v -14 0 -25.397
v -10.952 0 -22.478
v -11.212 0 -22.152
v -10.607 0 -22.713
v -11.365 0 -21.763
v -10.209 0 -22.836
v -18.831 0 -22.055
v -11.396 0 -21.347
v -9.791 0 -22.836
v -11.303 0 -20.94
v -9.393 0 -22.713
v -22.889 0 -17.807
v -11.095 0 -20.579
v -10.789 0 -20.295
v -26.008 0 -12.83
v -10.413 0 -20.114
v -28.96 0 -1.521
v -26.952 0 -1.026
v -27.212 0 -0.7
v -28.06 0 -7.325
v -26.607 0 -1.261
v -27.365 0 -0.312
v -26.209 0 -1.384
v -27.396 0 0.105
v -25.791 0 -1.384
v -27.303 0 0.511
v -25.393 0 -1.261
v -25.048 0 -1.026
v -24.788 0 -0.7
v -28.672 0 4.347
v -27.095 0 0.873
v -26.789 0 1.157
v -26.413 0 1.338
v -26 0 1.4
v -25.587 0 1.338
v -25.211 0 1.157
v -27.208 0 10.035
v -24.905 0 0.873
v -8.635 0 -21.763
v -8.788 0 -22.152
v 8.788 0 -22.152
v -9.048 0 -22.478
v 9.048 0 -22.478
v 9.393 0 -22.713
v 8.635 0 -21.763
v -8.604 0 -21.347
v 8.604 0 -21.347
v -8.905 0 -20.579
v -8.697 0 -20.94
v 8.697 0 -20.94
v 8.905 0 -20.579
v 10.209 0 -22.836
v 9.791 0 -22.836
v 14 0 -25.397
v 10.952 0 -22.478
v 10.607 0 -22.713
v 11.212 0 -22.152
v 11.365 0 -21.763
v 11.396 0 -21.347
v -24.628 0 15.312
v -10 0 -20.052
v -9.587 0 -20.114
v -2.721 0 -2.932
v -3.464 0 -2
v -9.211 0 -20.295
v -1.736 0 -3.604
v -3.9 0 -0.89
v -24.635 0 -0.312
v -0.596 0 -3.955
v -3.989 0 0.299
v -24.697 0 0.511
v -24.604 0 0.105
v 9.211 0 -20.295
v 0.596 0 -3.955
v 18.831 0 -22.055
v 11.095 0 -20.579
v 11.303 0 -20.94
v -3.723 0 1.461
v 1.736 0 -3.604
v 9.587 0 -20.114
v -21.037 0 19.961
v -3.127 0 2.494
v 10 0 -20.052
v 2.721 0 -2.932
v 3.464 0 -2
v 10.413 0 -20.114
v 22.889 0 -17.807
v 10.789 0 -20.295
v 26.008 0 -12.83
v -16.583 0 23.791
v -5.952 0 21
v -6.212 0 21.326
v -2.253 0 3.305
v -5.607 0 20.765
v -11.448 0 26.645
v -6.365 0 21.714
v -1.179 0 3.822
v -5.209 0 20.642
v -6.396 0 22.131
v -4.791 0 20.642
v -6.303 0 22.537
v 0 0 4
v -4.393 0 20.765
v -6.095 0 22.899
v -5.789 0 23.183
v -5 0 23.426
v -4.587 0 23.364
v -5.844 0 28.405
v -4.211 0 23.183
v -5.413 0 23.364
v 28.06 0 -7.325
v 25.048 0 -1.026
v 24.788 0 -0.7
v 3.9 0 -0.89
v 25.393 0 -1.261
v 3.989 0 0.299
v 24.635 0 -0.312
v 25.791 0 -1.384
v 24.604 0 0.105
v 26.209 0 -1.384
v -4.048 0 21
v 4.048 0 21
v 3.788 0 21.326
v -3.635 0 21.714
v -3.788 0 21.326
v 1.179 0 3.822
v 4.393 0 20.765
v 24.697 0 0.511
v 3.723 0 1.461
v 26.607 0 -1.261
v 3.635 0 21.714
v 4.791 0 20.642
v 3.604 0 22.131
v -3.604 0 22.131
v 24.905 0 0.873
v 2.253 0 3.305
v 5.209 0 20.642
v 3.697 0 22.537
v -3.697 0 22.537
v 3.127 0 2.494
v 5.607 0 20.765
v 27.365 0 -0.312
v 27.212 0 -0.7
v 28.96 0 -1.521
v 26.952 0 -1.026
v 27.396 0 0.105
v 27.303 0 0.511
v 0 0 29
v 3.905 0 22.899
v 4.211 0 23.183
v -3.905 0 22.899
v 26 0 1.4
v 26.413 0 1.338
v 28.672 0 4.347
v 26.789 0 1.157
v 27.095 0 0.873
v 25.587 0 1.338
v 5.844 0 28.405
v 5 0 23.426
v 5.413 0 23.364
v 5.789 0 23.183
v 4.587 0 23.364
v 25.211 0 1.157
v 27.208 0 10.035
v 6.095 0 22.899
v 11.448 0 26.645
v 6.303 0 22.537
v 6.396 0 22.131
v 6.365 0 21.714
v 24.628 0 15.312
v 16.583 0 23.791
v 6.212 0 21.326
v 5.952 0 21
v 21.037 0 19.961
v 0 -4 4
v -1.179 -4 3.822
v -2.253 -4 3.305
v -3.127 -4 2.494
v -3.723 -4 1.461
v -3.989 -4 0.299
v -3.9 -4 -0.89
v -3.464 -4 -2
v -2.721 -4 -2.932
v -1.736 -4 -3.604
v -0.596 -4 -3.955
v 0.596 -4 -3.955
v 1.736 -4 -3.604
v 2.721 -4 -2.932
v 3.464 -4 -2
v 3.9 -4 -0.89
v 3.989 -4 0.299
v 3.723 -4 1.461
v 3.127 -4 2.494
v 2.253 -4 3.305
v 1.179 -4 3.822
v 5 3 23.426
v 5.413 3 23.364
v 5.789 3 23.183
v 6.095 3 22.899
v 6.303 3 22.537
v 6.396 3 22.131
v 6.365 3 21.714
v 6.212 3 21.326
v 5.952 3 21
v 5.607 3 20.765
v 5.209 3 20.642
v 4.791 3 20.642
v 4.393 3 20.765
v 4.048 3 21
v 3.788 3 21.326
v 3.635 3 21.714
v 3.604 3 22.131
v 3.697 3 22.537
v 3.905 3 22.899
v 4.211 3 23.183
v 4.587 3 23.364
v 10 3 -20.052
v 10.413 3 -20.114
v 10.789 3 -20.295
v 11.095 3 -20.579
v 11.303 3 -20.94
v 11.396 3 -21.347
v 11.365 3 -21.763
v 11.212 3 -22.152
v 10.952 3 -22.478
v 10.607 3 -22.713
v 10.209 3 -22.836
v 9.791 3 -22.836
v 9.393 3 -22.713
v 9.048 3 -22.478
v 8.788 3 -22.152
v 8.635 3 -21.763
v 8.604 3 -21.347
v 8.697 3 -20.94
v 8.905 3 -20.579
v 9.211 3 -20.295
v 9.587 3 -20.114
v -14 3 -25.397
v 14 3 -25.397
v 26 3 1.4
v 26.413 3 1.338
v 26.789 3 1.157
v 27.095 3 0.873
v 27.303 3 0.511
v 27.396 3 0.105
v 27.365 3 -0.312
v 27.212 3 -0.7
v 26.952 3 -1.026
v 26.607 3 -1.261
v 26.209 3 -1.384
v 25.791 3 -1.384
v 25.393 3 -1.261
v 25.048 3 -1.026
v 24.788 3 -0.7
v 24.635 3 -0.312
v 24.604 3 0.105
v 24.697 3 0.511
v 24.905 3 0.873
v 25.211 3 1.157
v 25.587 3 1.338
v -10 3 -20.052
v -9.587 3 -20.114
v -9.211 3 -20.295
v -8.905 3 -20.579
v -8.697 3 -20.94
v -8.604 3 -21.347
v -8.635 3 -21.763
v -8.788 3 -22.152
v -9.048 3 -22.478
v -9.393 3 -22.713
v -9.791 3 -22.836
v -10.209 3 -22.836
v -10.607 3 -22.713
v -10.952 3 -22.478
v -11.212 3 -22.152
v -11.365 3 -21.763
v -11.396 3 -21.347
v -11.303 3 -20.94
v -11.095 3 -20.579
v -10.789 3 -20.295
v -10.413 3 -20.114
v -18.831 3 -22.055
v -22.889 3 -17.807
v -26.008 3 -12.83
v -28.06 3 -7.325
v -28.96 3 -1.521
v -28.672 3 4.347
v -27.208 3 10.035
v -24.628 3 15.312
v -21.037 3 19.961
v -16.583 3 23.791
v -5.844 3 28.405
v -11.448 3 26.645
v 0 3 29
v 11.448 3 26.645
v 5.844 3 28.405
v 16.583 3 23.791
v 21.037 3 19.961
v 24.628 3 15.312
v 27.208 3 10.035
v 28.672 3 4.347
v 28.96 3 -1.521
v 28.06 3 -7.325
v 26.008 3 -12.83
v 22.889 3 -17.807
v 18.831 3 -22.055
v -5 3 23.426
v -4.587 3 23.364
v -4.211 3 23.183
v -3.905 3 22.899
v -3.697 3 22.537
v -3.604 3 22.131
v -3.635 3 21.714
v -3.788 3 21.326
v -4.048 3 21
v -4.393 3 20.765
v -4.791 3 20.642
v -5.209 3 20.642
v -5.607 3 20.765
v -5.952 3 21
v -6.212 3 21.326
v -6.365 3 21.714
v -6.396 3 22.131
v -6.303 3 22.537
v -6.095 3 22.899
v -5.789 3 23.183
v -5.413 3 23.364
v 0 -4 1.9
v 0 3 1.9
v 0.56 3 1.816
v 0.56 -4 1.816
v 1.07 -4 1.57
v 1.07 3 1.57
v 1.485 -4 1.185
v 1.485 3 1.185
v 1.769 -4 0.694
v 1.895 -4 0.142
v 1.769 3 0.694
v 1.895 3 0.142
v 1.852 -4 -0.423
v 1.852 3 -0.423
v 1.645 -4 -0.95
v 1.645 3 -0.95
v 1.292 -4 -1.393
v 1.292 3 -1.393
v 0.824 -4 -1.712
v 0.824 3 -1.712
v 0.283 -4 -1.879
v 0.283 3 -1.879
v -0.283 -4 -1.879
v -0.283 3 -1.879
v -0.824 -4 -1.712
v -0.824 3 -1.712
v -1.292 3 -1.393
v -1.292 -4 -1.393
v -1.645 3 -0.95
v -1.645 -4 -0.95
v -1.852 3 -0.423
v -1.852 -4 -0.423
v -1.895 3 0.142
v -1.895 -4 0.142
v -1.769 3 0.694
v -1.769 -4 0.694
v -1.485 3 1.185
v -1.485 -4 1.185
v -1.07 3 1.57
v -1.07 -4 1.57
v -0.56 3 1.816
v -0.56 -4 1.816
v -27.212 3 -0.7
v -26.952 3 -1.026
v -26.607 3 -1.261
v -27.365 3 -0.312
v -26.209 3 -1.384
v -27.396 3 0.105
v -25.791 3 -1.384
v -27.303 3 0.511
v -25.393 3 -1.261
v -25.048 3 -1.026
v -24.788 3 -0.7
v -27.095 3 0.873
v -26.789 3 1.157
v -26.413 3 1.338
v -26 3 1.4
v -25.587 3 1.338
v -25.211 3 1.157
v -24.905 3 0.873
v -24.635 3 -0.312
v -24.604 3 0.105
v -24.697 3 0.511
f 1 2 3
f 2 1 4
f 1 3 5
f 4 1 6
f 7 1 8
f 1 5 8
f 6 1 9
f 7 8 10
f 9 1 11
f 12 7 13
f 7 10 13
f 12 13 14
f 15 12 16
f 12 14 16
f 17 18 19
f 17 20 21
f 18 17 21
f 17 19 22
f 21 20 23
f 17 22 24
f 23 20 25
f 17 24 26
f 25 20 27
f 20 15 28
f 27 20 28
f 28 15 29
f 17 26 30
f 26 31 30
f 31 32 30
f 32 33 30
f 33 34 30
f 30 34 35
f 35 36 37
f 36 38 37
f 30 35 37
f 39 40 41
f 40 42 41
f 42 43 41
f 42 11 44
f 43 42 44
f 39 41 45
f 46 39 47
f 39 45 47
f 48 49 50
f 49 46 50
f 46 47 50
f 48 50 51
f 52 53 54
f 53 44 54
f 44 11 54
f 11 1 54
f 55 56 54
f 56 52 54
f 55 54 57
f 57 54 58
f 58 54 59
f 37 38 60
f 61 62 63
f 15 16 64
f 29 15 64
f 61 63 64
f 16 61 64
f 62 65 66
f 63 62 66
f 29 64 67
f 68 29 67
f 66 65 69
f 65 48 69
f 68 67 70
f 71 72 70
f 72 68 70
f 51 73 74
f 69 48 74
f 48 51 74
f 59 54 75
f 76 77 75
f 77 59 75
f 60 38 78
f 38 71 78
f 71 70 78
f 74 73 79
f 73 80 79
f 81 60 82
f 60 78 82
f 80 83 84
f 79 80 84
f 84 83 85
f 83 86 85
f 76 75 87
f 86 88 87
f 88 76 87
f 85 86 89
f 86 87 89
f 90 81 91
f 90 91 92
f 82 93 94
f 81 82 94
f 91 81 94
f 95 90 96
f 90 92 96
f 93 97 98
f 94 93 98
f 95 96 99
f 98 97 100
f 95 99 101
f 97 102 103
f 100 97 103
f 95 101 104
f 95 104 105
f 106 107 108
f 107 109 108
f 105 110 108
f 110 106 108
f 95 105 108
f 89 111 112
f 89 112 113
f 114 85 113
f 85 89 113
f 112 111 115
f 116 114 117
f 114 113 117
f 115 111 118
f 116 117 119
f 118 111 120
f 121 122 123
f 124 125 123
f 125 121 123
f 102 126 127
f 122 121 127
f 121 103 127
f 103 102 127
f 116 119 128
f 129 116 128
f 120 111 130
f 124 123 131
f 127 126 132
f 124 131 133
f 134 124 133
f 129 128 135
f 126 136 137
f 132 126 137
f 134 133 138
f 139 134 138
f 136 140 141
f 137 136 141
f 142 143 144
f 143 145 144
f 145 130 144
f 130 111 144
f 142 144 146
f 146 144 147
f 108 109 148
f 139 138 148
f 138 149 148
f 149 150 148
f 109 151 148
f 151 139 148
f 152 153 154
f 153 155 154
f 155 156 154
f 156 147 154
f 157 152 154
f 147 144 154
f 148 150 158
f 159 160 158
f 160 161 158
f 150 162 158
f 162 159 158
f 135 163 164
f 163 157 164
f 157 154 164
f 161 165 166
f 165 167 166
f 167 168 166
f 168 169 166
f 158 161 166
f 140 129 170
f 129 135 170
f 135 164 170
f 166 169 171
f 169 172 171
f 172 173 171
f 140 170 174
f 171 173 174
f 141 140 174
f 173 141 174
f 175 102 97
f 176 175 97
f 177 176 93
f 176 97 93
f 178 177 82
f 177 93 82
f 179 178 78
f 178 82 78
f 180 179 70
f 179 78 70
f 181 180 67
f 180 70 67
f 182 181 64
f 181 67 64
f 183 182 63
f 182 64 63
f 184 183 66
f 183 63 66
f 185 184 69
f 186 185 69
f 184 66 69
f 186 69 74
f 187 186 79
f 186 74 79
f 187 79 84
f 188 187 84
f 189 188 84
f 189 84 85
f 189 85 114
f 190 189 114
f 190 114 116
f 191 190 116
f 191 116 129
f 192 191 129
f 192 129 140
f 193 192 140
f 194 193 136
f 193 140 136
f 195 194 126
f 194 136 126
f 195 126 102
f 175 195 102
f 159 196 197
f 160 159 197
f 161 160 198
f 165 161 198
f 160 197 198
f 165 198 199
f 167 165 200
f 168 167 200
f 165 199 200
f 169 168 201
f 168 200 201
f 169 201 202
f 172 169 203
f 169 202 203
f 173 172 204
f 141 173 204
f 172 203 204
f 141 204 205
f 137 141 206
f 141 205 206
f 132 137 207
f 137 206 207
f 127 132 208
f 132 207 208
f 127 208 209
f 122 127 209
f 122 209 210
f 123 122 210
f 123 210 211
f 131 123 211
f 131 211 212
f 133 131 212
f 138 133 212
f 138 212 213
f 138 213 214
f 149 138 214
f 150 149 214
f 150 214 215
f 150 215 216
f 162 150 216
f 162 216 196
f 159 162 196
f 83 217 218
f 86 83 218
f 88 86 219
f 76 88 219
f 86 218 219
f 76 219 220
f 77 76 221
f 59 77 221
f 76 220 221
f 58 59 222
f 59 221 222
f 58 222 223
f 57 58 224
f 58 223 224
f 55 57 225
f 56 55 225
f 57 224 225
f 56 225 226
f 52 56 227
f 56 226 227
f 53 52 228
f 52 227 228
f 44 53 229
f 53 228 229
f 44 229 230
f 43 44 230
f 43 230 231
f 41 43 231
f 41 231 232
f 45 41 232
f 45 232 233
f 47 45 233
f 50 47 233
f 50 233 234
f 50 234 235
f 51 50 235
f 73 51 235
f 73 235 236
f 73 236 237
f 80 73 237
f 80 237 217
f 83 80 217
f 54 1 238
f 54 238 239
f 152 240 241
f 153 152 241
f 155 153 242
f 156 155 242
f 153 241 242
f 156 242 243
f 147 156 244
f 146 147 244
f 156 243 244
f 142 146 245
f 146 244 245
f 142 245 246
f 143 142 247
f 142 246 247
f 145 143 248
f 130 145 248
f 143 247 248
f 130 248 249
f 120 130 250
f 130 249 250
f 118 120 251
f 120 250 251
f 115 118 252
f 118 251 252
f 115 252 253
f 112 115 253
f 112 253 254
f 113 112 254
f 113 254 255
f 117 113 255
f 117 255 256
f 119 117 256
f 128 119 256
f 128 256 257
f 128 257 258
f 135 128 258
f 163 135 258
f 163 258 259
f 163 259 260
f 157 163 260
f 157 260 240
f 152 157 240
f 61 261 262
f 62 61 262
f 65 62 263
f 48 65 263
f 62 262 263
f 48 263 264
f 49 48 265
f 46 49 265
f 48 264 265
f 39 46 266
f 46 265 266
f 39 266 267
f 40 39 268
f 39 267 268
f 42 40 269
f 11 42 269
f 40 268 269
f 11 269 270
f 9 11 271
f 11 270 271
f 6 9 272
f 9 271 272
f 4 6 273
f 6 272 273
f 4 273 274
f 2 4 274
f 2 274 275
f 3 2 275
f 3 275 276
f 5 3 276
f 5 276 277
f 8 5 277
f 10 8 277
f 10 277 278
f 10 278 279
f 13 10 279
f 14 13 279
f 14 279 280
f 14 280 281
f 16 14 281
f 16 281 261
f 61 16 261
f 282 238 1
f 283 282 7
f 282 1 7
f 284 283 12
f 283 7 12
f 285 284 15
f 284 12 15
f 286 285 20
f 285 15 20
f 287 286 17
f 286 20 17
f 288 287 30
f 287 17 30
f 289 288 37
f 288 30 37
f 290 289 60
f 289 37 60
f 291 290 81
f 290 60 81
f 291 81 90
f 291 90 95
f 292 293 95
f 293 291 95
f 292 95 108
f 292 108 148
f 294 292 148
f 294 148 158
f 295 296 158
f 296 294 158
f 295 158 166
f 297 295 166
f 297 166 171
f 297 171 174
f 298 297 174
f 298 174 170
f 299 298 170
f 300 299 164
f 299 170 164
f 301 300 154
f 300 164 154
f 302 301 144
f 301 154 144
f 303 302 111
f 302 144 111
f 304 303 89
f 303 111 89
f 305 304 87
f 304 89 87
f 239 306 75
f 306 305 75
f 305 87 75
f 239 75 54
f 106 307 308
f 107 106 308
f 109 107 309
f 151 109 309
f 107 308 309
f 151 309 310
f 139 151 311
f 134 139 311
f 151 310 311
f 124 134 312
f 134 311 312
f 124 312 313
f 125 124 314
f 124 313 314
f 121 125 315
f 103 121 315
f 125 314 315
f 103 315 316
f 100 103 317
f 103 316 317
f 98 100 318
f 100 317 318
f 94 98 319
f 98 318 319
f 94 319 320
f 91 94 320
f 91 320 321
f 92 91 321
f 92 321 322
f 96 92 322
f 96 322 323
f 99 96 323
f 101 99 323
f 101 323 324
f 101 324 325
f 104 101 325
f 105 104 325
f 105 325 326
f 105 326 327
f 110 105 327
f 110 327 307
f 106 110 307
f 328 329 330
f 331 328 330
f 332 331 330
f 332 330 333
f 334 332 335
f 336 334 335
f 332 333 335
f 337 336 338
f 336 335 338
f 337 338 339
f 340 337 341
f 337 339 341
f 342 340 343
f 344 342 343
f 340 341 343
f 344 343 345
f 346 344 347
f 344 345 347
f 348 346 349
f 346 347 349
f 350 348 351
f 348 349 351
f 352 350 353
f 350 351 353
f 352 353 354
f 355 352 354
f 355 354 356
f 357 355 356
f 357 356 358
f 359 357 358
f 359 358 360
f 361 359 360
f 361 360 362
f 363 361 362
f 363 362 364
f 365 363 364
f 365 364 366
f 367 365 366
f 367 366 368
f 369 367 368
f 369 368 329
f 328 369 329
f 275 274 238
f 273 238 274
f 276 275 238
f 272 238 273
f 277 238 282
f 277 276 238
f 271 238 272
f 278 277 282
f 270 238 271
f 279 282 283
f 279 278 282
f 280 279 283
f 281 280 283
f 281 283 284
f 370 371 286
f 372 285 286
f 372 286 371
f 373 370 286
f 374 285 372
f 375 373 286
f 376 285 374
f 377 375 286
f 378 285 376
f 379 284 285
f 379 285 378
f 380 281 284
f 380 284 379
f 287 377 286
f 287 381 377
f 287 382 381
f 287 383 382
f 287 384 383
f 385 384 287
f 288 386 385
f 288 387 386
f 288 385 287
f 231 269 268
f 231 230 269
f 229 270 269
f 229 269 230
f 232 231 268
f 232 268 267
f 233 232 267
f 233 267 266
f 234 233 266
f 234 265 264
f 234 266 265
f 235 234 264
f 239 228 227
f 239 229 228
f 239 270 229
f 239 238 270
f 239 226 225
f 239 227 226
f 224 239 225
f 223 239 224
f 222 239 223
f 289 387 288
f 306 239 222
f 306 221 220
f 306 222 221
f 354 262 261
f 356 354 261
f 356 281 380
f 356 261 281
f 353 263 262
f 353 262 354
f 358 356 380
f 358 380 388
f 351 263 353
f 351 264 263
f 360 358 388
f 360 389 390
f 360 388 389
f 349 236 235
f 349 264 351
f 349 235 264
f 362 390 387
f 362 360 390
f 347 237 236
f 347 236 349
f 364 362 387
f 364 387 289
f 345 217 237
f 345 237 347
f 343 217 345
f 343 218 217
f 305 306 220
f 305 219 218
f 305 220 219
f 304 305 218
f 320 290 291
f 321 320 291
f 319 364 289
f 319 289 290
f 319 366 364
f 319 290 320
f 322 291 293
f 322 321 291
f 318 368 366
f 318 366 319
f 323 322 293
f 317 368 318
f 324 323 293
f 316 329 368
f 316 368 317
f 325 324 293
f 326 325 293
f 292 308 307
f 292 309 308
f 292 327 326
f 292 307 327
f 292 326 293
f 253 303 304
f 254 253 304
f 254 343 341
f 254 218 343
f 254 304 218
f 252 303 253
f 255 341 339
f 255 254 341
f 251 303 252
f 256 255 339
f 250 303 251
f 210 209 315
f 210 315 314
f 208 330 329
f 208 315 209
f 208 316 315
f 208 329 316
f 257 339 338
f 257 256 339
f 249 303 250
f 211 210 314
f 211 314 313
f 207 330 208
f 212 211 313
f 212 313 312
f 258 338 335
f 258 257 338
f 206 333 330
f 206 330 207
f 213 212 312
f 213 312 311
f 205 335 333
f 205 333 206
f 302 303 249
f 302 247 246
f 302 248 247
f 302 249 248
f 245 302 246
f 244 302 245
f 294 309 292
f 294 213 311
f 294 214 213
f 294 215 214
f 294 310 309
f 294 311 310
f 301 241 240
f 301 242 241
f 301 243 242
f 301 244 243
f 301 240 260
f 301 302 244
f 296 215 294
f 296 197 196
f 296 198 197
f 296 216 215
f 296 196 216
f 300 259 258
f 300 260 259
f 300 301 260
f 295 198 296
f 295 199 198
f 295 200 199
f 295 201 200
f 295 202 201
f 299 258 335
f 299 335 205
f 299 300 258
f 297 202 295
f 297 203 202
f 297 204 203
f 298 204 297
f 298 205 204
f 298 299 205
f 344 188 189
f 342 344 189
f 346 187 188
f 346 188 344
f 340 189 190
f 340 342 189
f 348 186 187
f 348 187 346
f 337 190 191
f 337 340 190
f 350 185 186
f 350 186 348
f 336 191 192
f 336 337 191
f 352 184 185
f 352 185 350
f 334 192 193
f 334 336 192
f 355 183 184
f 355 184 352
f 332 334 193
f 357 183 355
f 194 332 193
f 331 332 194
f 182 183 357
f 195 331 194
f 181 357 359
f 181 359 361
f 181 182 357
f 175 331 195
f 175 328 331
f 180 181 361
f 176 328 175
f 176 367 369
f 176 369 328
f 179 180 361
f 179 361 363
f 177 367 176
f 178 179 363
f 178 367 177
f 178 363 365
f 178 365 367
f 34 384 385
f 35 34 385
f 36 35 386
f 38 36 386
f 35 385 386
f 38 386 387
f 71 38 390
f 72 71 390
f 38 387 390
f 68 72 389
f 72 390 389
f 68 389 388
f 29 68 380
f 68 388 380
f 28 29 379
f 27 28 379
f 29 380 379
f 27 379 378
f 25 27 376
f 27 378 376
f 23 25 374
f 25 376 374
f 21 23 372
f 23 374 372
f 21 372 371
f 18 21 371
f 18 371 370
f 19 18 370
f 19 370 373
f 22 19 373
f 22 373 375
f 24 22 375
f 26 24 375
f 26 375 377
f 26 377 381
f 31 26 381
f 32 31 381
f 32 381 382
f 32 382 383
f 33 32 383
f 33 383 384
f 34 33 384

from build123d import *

# Parameters (mm, degrees)
SKETCH1_R           = 29
BOSS_EXTRUDE1_DEPTH = 3
SKETCH3_R           = 4
BOSS_EXTRUDE2_DEPTH = 4
SKETCH2_R           = 1.9
CUT_EXTRUDE1_DEPTH  = 42.605288125
SKETCH6_R           = 1.4
CUT_EXTRUDE3_DEPTH  = 10
SKETCH7_R           = 1.4
CUT_EXTRUDE4_DEPTH  = 10
CUT_EXTRUDE5_START  = -10
CUT_EXTRUDE5_DEPTH  = 10
SKETCH4_R           = 1.4
CUT_EXTRUDE7_DEPTH  = 10


with BuildPart() as part:
    # Sketch1 → Boss-Extrude1 (new body)
    with BuildSketch(Plane(origin=(0, 0, 0), x_dir=(1, 0, 0), z_dir=(0, 1, 0))):
        Circle(SKETCH1_R)
    extrude(amount=BOSS_EXTRUDE1_DEPTH)

    # Sketch3 → Boss-Extrude2 (add)
    with BuildSketch(Plane.XZ):
        Circle(SKETCH3_R)
    extrude(amount=BOSS_EXTRUDE2_DEPTH)

    # Sketch2 → Cut-Extrude1 (cut, through all)
    with BuildSketch(Plane(origin=(0, 3, 0), x_dir=(1, 0, 0), z_dir=(0, 1, 0))):
        Circle(SKETCH2_R)
    extrude(amount=-CUT_EXTRUDE1_DEPTH, mode=Mode.SUBTRACT)

    # Sketch6 → Cut-Extrude3 (cut)
    with BuildSketch(Plane(origin=(0, 3, 0), x_dir=(1, 0, 0), z_dir=(0, 1, 0))):
        with Locations((26, 0)):
            Circle(SKETCH6_R)
        with Locations((-26, 0)):
            Circle(SKETCH6_R)
    extrude(amount=-CUT_EXTRUDE3_DEPTH, mode=Mode.SUBTRACT)

    # Sketch7 → Cut-Extrude4 (cut)
    with BuildSketch(Plane(origin=(0, 3, 0), x_dir=(1, 0, 0), z_dir=(0, 1, 0))):
        with Locations((-10, 21.451657064)):
            Circle(SKETCH7_R)
        with Locations((10, 21.451657064)):
            Circle(SKETCH7_R)
    extrude(amount=-CUT_EXTRUDE4_DEPTH, mode=Mode.SUBTRACT)

    # Sketch7<3> → Cut-Extrude5 (cut)
    with BuildSketch(Plane(origin=(0, 3, 0), x_dir=(1, 0, 0), z_dir=(0, 1, 0)).offset(CUT_EXTRUDE5_START)):
        with BuildLine():
            Line((-14, 25.396850198), (14, 25.396850198))
            ThreePointArc((14, 25.396850198), (0, 29), (-14, 25.396850198))
        make_face()
    extrude(amount=CUT_EXTRUDE5_DEPTH, mode=Mode.SUBTRACT)

    # Sketch4 → Cut-Extrude7 (cut)
    with BuildSketch(Plane(origin=(0, 3, 0), x_dir=(1, 0, 0), z_dir=(0, 1, 0))):
        with Locations((-5, -22.025954195)):
            Circle(SKETCH4_R)
        with Locations((5, -22.025954195)):
            Circle(SKETCH4_R)
    extrude(amount=-CUT_EXTRUDE7_DEPTH, mode=Mode.SUBTRACT)


solid = part.part
